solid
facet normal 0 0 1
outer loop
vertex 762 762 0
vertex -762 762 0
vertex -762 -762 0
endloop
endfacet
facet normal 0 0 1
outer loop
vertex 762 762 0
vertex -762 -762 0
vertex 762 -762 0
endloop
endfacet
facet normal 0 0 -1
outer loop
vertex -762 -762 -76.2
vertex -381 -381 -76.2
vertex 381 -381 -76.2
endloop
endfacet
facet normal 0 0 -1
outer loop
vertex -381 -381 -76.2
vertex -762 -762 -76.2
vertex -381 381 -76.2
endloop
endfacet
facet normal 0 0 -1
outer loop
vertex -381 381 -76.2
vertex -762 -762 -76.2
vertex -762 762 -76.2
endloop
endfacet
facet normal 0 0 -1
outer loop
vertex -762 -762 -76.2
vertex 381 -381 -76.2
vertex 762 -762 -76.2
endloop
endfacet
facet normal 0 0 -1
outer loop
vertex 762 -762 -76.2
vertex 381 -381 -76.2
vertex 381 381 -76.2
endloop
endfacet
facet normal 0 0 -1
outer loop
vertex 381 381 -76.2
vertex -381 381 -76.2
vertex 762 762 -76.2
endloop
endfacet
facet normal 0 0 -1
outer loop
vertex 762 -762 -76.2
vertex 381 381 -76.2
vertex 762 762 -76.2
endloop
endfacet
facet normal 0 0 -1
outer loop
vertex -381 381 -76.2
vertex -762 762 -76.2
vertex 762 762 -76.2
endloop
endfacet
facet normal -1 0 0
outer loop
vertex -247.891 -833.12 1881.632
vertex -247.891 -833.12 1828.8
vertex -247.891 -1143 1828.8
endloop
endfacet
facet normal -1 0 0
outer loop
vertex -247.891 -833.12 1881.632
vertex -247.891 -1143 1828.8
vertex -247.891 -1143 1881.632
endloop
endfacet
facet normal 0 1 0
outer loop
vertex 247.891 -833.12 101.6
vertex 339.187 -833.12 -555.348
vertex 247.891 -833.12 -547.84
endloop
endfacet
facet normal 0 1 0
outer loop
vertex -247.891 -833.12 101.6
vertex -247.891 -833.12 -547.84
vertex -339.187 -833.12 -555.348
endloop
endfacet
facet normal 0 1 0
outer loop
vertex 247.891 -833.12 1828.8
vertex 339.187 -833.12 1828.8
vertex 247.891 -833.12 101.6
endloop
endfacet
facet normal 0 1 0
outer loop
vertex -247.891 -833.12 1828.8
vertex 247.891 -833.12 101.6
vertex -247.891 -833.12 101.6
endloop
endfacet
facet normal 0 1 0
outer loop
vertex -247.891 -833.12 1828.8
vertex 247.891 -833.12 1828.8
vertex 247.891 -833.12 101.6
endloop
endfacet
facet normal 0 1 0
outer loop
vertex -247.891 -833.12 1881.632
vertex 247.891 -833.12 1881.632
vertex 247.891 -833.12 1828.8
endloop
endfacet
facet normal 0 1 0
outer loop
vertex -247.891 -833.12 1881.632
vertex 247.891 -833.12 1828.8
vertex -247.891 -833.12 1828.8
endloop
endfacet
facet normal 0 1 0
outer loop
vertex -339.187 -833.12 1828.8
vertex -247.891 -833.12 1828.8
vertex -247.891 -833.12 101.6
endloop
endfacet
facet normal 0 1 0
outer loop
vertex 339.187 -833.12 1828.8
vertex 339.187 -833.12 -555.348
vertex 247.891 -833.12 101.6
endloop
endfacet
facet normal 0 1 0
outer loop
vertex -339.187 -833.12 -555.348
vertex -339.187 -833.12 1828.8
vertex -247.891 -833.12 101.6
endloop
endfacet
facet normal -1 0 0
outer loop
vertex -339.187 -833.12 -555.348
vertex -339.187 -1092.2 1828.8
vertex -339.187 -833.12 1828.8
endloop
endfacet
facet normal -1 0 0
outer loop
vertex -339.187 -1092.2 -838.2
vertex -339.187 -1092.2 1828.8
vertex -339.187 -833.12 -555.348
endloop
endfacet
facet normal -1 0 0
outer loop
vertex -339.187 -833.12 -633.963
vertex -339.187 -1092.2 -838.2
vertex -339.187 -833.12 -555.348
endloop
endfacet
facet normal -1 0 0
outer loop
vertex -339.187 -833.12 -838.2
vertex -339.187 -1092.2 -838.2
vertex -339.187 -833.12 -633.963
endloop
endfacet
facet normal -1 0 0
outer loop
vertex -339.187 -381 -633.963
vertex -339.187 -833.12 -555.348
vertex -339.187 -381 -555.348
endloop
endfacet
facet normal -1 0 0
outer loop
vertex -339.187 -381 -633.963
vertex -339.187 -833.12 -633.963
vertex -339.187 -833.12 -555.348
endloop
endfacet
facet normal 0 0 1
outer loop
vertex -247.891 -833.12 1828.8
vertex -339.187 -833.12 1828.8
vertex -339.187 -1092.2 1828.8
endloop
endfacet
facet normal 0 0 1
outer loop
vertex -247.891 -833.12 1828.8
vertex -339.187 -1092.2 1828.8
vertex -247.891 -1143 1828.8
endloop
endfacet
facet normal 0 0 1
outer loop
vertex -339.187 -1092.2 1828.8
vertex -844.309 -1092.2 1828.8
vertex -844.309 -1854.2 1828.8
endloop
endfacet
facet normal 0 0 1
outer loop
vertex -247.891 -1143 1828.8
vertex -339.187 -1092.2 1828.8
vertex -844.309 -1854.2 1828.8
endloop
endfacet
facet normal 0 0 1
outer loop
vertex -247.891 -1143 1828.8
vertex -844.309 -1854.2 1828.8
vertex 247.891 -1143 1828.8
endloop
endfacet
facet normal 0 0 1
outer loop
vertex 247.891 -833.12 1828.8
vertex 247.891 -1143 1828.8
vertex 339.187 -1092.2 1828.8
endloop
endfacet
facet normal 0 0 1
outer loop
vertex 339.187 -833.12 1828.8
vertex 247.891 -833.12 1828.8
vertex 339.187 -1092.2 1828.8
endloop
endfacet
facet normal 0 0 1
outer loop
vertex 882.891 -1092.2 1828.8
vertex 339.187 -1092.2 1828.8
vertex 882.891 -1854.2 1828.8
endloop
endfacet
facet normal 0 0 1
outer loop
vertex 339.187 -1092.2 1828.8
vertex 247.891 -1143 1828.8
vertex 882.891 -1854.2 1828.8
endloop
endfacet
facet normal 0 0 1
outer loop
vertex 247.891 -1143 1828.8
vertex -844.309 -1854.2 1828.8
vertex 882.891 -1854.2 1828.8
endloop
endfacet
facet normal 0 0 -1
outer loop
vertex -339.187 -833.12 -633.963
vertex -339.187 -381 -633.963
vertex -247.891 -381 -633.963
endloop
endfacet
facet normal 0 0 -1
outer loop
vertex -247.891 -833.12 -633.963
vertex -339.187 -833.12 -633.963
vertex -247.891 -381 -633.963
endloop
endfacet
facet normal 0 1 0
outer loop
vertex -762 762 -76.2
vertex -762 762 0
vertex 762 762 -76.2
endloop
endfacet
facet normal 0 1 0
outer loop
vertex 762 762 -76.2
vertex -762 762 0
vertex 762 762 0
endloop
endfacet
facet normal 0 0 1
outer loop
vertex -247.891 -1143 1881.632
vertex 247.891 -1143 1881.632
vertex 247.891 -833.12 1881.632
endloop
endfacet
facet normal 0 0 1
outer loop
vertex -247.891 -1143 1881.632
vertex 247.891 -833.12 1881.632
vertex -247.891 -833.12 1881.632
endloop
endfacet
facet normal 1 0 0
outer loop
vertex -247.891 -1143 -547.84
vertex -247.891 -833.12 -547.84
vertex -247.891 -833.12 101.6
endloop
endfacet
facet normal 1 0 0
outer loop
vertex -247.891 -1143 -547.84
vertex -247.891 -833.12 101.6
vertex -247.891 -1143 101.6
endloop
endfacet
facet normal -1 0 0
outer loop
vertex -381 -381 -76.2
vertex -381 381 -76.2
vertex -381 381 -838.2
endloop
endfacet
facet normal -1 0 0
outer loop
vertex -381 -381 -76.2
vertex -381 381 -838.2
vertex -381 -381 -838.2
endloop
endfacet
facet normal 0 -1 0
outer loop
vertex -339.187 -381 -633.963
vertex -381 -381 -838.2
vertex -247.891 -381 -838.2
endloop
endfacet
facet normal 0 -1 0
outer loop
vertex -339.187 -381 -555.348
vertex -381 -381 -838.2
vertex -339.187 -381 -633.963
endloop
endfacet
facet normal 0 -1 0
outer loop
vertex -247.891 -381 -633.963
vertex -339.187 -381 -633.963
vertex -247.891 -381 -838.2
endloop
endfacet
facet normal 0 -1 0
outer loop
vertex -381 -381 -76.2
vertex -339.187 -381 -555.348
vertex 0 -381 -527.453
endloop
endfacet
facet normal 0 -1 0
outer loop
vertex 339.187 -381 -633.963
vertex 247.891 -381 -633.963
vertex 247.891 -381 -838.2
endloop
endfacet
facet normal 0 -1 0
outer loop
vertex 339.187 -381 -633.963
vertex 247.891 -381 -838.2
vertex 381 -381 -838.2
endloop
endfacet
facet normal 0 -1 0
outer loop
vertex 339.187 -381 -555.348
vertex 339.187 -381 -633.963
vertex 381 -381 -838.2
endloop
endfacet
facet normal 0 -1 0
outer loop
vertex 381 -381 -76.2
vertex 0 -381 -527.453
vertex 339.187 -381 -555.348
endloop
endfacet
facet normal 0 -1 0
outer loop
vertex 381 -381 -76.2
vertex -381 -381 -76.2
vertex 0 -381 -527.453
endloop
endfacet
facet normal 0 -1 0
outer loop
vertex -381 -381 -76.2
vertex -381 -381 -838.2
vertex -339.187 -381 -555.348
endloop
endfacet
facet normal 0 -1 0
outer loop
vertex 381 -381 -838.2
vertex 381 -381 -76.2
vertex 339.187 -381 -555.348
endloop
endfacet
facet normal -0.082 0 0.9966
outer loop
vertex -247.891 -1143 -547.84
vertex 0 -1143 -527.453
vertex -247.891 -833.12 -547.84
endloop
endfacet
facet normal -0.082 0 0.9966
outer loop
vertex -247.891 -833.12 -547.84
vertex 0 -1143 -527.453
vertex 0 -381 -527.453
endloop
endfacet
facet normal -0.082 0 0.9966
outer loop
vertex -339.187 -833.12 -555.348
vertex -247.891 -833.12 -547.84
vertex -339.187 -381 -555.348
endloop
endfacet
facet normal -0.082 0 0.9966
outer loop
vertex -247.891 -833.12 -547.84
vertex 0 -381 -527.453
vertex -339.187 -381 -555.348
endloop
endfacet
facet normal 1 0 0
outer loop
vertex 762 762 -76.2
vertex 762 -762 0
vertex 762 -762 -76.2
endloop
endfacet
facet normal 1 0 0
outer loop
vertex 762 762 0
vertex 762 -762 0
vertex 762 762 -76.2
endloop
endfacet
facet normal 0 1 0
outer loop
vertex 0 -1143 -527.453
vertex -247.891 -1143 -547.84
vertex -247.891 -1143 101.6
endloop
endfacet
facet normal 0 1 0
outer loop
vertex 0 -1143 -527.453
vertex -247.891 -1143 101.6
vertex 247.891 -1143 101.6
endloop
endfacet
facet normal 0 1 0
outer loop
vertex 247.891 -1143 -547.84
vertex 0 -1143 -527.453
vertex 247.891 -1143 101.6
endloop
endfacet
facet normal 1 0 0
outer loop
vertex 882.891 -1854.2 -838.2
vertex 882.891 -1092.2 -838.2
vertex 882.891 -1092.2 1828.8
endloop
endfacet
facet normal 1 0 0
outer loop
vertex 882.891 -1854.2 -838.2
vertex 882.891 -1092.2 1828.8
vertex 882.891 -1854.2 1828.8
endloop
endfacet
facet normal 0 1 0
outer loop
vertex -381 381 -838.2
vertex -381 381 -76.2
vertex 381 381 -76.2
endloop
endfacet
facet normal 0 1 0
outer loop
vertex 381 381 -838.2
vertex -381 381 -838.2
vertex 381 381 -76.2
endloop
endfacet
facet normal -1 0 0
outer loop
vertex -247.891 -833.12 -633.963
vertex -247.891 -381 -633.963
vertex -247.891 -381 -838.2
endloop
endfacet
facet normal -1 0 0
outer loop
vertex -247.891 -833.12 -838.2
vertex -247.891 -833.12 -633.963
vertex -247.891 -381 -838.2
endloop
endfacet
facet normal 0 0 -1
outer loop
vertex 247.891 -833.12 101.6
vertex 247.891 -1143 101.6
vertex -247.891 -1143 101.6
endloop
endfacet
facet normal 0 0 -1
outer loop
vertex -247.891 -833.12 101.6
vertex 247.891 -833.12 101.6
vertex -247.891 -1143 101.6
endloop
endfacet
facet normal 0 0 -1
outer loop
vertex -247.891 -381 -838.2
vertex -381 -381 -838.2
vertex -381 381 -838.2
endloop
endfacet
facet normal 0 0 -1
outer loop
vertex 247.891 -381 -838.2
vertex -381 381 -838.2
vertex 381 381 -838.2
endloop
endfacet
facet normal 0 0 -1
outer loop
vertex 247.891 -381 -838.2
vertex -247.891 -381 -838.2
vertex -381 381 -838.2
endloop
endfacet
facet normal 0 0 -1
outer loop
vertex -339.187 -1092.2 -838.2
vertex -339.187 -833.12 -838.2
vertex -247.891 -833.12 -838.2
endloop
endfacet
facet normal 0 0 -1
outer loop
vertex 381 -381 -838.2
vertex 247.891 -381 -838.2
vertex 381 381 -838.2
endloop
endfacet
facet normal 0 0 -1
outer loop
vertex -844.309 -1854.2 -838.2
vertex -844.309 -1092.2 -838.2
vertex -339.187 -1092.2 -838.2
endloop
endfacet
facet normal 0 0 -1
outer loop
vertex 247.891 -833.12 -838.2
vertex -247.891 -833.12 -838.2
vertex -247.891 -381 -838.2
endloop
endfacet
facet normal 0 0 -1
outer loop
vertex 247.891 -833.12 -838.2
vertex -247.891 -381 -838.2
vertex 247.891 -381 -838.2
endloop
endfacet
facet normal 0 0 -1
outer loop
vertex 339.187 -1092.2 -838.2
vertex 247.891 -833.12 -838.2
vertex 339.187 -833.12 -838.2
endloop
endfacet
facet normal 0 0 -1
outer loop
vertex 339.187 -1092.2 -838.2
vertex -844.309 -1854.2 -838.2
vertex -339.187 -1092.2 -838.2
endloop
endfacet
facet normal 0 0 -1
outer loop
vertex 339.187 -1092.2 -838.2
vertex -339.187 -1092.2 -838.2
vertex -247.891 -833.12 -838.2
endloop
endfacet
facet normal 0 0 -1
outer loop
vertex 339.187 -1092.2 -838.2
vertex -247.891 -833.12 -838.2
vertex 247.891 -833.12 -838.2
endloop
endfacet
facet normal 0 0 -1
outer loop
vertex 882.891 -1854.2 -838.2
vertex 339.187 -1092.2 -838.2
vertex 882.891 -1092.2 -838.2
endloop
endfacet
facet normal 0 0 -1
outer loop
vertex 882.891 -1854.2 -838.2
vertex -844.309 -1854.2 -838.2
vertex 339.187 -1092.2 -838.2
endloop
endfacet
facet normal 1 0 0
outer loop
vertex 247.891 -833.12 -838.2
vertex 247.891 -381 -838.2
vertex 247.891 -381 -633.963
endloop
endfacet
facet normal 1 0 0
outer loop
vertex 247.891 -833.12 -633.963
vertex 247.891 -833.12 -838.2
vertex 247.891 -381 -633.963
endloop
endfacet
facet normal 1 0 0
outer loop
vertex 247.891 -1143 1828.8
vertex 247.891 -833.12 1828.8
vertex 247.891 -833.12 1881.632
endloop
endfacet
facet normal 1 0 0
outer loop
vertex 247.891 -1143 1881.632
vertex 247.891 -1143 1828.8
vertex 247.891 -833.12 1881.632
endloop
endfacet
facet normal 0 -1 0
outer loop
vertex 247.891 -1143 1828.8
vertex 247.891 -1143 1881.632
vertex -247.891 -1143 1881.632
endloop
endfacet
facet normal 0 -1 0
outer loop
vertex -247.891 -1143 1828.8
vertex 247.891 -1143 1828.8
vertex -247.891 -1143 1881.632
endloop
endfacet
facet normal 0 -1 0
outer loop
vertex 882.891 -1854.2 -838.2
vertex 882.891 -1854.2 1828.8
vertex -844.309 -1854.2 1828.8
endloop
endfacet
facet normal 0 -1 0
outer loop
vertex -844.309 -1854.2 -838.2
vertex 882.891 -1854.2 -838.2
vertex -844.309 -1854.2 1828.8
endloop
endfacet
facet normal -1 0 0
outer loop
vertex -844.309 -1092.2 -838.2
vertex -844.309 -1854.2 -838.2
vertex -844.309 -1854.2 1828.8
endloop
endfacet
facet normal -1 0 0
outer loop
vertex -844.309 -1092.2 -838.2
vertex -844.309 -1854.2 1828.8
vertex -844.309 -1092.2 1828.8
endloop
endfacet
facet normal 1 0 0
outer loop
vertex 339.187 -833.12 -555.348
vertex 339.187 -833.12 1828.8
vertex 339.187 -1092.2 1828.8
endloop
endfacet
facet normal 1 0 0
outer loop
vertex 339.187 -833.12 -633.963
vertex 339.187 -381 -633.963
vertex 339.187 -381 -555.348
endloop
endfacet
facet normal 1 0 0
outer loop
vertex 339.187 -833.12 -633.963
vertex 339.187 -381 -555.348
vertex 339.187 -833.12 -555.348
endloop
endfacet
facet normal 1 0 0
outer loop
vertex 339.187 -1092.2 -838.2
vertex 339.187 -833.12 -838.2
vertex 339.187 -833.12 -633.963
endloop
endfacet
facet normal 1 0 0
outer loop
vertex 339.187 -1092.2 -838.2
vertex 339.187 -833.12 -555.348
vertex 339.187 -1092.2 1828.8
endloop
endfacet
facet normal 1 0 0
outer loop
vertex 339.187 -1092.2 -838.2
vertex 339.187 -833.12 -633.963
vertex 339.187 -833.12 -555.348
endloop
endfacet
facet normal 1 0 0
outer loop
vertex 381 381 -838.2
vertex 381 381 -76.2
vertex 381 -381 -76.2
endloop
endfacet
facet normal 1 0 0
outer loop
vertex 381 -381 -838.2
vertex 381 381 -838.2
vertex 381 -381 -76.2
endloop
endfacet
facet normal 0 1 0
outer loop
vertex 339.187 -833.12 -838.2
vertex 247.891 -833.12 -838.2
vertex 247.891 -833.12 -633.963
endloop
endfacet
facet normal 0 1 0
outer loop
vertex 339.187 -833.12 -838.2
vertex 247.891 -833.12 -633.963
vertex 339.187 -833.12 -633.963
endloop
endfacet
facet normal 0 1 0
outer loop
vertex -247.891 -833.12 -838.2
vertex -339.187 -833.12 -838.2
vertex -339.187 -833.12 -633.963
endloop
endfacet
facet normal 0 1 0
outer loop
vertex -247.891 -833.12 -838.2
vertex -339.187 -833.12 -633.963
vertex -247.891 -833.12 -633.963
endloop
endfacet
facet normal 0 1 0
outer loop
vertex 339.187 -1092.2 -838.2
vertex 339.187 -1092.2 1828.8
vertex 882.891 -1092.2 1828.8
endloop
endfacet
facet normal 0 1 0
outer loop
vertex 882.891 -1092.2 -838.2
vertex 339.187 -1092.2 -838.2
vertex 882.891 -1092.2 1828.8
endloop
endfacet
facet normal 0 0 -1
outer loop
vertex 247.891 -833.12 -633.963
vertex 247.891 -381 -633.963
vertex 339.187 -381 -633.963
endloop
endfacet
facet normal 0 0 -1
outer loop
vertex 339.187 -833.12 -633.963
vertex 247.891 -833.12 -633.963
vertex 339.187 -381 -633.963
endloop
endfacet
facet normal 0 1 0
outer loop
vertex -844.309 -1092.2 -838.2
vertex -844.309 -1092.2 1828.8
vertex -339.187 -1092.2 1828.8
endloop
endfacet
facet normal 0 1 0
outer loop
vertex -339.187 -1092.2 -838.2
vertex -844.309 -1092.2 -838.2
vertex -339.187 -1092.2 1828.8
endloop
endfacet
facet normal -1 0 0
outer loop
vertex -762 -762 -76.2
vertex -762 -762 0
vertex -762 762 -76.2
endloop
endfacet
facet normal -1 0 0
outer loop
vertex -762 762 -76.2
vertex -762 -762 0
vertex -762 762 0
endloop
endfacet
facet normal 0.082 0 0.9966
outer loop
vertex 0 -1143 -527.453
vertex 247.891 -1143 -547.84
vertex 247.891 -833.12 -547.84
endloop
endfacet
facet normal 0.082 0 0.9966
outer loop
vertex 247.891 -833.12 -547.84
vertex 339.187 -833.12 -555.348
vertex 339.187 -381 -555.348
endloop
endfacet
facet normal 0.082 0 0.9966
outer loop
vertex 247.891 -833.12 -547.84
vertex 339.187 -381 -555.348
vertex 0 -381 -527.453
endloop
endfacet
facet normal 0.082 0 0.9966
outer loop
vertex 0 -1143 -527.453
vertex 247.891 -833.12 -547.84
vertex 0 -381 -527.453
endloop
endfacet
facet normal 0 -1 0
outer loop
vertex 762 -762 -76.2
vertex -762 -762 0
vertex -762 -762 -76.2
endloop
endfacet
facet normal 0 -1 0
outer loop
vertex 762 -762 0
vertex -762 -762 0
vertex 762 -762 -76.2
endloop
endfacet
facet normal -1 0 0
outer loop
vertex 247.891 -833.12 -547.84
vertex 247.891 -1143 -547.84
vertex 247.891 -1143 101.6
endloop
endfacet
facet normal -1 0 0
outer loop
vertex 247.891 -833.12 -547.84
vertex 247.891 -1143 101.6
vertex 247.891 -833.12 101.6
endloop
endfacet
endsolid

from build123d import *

# Parameters (mm, degrees)
F0_W     = 1524
F0_H     = 1524
F1_DEPTH = 76.2
F2_W     = 762
F2_H     = 762
F3_DEPTH = 762
F5_DEPTH = 762
F7_DEPTH = 2667
F8_W     = 495.782912
F8_H     = 1780.032
F9_DEPTH = 309.88


with BuildPart() as f1:
    # F0 (on Top) → F1 (new body)
    with BuildSketch(Plane.XY):
        Rectangle(F0_W, F0_H)
    extrude(amount=-F1_DEPTH)

    # F2 (on face) → F3 (join)
    with BuildSketch(Plane(origin=(0, 0, -76.2), x_dir=(1, 0, 0), z_dir=(0, 0, -1))):
        Rectangle(F2_W, F2_H)
    extrude(amount=F3_DEPTH)

    # F4 (on face) → F5 (join)
    with BuildSketch(Plane.XZ.offset(381)):
        Polygon((-247.891456, -633.963466), (-247.891456, -838.2), (247.891456, -838.2), (247.891456, -633.963466), (339.186549, -633.963466), (339.186549, -555.348217), (0, -527.452528), (-339.186549, -555.348217), (-339.186549, -633.963466), align=None)
    extrude(amount=F5_DEPTH)

    # F6 (on face) → F7 (join)
    with BuildSketch(Plane(origin=(0, 0, -838.2), x_dir=(1, 0, 0), z_dir=(0, 0, -1))):
        Polygon((882.891456, 1092.2), (882.891456, 1854.2), (-844.308544, 1854.2), (-844.308544, 1092.2), (-339.186549, 1092.2), (-339.186549, 833.12), (-247.891456, 833.12), (-247.891456, 1143), (247.891456, 1143), (247.891456, 833.12), (339.186549, 833.12), (339.186549, 1092.2), align=None)
    extrude(amount=-F7_DEPTH)

    # F8 (on face) → F9 (join, through all)
    with BuildSketch(Plane(origin=(0, -1143, 0), x_dir=(-1, 0, 0), z_dir=(0, 1, 0))):
        with Locations((0, 991.616)):
            Rectangle(F8_W, F8_H)
    extrude(amount=F9_DEPTH)


solid = f1.part
